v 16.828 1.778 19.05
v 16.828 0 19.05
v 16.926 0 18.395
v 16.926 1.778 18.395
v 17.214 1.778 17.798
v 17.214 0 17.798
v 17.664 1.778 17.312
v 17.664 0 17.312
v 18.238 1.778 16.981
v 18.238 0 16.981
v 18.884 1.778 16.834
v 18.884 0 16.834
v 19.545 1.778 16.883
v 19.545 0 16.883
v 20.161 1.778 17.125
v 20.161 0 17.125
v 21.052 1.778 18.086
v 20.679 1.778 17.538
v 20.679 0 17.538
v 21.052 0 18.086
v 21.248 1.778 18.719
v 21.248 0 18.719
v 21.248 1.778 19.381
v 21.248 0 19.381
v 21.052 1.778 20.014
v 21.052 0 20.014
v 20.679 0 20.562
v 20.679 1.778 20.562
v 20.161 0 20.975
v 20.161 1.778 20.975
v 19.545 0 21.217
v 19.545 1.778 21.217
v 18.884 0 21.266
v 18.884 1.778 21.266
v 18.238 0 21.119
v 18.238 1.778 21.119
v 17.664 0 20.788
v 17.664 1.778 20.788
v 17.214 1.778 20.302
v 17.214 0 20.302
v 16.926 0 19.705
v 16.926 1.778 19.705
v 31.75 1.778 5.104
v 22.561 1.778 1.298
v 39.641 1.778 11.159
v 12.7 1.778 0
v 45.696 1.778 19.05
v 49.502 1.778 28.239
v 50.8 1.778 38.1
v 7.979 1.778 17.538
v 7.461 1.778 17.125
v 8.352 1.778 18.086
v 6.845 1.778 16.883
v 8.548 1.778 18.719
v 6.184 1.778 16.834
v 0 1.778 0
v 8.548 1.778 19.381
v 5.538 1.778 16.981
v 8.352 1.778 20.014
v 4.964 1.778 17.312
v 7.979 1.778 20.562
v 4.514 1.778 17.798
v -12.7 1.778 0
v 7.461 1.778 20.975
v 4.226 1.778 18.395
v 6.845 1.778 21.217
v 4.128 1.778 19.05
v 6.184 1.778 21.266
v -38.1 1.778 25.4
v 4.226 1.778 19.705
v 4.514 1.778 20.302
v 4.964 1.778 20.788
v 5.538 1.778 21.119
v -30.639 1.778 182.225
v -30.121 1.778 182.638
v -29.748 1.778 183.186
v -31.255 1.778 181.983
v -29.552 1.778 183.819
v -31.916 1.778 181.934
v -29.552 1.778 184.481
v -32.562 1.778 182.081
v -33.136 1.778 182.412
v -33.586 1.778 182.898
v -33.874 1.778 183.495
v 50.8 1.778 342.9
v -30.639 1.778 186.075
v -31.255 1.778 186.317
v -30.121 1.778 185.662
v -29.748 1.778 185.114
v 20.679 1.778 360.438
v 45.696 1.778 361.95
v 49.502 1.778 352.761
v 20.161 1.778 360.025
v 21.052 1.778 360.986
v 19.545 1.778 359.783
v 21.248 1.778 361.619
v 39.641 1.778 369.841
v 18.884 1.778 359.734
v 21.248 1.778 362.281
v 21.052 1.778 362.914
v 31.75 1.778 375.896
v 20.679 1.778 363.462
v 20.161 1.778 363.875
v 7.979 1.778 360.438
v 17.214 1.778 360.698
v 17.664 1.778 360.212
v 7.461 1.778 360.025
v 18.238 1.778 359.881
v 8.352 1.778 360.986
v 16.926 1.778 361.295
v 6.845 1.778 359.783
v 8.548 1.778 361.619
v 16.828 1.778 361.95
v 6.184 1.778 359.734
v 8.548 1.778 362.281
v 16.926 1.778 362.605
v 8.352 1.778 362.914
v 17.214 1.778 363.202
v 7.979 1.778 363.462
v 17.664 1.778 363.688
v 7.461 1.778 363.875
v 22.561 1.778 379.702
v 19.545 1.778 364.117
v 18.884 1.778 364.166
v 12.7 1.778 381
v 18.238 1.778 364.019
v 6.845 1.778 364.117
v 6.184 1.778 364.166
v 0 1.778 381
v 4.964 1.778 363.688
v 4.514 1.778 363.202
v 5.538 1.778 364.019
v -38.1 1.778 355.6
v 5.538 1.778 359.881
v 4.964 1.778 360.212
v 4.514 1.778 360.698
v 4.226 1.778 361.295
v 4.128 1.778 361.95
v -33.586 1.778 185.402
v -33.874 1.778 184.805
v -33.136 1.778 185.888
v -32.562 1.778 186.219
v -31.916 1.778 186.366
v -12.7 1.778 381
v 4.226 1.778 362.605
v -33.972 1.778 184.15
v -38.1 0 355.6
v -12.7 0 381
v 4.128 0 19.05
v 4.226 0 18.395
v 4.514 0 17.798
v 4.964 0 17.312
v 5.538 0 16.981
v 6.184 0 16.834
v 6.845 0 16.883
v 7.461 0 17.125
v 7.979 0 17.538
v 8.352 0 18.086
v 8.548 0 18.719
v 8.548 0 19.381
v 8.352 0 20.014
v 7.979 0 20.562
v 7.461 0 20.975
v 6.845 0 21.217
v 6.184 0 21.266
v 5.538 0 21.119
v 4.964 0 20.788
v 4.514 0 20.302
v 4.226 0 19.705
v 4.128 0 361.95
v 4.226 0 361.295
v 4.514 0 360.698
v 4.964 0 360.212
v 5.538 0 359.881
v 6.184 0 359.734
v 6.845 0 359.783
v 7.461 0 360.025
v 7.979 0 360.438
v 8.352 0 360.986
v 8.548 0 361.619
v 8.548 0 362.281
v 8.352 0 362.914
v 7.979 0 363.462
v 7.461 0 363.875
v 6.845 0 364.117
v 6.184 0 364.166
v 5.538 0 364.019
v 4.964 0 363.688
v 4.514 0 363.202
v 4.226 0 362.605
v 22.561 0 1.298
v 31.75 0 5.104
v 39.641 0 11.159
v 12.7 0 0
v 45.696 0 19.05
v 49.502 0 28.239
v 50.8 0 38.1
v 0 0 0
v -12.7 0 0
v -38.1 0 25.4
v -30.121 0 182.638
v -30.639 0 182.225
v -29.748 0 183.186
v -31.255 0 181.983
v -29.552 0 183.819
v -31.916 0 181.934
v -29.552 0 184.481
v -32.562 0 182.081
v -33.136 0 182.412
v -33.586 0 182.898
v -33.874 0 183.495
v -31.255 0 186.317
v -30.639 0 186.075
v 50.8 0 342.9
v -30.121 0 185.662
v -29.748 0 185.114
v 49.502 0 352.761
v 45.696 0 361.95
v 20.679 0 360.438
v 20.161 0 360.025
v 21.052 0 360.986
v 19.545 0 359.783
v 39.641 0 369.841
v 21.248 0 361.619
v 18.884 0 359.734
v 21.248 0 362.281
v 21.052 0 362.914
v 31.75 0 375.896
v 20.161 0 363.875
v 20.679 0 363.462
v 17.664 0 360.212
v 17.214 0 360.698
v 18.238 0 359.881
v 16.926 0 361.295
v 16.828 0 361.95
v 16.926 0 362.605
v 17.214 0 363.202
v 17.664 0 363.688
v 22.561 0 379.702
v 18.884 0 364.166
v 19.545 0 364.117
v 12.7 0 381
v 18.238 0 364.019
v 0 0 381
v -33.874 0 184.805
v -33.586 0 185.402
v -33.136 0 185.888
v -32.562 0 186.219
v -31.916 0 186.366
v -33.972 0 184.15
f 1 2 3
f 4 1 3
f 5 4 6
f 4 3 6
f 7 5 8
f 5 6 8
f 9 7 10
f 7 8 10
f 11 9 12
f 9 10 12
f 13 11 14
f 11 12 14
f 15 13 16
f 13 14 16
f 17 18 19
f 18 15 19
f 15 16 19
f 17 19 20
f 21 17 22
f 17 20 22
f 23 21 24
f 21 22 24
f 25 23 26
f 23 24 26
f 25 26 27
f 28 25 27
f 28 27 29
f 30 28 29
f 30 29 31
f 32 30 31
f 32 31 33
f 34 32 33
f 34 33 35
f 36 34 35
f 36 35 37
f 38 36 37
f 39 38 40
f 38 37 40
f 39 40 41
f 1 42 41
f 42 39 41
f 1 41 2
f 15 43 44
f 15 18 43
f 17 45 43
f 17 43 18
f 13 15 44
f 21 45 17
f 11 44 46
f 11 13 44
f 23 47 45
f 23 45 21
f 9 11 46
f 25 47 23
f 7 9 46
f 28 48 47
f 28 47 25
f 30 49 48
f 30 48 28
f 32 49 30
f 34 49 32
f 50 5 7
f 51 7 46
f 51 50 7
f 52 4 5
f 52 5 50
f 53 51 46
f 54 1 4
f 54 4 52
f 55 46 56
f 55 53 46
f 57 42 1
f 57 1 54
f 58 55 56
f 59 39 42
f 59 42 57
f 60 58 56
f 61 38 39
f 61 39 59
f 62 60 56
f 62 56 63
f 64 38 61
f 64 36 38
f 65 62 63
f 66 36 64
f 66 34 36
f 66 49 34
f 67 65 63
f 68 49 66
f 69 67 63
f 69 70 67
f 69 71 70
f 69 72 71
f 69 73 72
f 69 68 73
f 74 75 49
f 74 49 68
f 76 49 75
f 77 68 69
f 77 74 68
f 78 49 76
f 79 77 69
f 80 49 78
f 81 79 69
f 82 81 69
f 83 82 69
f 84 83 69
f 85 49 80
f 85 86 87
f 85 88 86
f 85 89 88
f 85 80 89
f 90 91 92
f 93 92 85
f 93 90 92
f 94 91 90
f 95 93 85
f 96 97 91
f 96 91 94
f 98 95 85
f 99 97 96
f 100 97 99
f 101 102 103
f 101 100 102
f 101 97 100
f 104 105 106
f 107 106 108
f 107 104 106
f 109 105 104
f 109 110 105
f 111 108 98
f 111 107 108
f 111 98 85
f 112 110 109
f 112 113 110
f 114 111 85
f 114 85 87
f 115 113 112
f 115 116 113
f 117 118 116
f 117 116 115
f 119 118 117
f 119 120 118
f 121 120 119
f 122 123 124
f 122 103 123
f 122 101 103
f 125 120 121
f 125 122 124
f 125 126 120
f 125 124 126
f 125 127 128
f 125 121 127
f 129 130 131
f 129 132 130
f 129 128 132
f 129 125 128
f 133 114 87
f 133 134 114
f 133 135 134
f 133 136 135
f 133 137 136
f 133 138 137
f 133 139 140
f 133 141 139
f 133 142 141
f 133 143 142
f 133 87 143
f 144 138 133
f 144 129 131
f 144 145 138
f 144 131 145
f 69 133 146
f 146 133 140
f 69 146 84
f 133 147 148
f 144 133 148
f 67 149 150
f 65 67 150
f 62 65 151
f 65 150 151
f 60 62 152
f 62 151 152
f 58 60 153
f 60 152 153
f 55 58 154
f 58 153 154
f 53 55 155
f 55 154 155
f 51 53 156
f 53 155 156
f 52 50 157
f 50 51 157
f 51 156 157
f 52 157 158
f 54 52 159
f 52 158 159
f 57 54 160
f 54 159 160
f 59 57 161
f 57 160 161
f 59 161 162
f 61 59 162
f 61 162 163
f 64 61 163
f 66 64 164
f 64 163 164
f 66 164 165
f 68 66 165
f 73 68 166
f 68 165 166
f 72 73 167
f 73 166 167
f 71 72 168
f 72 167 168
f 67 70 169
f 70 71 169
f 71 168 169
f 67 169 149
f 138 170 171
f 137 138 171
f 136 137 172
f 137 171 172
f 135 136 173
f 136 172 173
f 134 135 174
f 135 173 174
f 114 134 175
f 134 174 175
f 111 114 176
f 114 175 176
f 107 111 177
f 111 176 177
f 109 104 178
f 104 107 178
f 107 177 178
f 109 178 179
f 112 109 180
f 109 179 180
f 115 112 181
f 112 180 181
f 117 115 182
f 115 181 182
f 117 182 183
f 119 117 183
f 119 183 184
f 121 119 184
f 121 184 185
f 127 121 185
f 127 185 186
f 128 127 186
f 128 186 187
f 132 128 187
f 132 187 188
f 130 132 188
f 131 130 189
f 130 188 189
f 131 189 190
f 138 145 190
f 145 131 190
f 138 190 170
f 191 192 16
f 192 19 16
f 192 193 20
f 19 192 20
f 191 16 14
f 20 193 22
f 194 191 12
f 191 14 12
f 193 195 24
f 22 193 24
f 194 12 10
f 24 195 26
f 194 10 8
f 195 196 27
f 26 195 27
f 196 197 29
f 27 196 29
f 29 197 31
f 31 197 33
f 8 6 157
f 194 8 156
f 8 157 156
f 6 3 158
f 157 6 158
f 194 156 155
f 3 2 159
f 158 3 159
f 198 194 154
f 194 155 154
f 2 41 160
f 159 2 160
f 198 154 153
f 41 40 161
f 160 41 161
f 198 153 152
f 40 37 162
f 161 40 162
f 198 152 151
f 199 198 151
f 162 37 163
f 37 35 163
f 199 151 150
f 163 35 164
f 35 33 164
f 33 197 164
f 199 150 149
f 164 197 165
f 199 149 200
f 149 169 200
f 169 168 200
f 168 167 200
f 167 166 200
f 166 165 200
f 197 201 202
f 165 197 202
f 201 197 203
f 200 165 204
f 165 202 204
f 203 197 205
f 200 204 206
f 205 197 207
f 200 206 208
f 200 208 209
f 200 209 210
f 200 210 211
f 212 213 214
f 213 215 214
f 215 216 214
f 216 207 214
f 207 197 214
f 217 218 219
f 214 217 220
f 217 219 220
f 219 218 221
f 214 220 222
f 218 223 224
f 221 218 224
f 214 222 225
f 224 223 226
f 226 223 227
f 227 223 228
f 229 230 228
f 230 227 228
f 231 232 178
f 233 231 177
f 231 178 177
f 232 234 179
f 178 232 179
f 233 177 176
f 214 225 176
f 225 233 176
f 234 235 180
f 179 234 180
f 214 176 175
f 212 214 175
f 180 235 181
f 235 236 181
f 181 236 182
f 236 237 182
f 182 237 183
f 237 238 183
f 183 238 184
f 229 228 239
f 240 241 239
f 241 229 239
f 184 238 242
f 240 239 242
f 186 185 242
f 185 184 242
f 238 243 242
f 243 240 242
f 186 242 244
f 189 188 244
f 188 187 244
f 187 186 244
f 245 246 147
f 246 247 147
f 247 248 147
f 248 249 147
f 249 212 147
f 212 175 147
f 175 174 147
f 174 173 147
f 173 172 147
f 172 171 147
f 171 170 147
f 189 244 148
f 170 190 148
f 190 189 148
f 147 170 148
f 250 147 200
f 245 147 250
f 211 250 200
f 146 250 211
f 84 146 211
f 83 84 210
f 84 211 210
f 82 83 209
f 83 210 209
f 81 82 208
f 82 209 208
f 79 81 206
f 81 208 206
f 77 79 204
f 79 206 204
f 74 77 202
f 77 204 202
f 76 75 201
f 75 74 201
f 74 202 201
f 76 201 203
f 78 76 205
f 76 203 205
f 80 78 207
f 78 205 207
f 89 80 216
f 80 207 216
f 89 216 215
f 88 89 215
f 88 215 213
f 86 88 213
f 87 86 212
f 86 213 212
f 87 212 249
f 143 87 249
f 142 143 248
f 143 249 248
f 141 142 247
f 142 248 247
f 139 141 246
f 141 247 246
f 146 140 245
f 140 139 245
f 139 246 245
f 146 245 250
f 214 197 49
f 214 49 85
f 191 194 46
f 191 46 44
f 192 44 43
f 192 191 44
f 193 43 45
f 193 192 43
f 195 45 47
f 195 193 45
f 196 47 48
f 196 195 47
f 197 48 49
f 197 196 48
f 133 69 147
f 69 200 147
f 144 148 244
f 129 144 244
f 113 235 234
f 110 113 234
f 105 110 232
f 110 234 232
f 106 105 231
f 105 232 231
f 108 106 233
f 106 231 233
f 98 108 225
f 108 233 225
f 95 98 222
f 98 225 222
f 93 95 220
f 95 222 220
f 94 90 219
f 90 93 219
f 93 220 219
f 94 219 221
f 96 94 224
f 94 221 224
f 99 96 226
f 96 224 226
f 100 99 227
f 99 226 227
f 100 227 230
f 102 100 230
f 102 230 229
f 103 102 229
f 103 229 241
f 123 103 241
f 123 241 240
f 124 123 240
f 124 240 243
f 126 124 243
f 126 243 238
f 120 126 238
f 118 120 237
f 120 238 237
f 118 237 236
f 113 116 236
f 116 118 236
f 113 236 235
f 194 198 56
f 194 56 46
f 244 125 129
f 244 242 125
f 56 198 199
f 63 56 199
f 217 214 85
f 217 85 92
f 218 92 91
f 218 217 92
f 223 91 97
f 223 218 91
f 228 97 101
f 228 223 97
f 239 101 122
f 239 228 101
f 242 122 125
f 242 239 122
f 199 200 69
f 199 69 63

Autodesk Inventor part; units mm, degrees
ref_plane "YZ Plane" through (0, 0, 0) normal (1, 0, 0) x (0, 1, 0)
ref_plane "XZ Plane" through (0, 0, 0) normal (0, 1, 0) x (-1, 0, 0)
ref_plane "XY Plane" through (0, 0, 0) normal (0, 0, 1) x (1, 0, 0)
sketch "Sketch1" plane through (0, 0, 0) normal (0, 1, 0) x (-1, 0, 0)
  line L0 (0, 0) -> (-12.7, 0)
  line L1 (-50.8, 38.1) -> (-50.8, 342.9)
  line L2 (-12.7, 381) -> (0, 381)
  line L3 (0, 0) -> (12.7, 0)
  line L4 (38.1, 25.4) -> (38.1, 355.6)
  line L5 (12.7, 381) -> (0, 381)
  arc A0 (-12.7, 381) -> (-50.8, 342.9) centre (-12.7, 342.9) ccw
  arc A1 (-50.8, 38.1) -> (-12.7, 0) centre (-12.7, 38.1) ccw
  line L6 (38.1, 355.6) -> (12.7, 381)
  line L7 (38.1, 25.4) -> (12.7, 0)
  circle A2 centre (31.75, 184.15) radius 2.2225
  circle A3 centre (-6.35, 19.05) radius 2.2225
  circle A4 centre (-19.05, 19.05) radius 2.2225
  circle A5 centre (-6.35, 361.95) radius 2.2225
  circle A6 centre (-19.05, 361.95) radius 2.2225
  point P0 (-50.8, 381)
  point P1 (-50.8, 0)
  point P2 (38.1, 381)
  point P3 (38.1, 0)
  dimension "d0" = 50.8
  dimension "d1" = 381
  dimension "d2" = 38.1
  dimension "d3" = 381
  dimension "d4" = 38.1
  dimension "d5" = 25.4
  dimension "d6" = 25.4
  dimension "d7" = 25.4
  dimension "d8" = 25.4
  dimension "d12" = 4.445
  dimension "d13" = 4.445
  dimension "d14" = 4.445
  dimension "d15" = 4.445
  dimension "d16" = 4.445
extrude "Extrusion1" add sketch "Sketch1" along normal blind 1.778
equation "\"d6\" = d5"
equation "\"d7\" = d5"
equation "\"d8\" = d7"
properties part number "side_ring_guard"
